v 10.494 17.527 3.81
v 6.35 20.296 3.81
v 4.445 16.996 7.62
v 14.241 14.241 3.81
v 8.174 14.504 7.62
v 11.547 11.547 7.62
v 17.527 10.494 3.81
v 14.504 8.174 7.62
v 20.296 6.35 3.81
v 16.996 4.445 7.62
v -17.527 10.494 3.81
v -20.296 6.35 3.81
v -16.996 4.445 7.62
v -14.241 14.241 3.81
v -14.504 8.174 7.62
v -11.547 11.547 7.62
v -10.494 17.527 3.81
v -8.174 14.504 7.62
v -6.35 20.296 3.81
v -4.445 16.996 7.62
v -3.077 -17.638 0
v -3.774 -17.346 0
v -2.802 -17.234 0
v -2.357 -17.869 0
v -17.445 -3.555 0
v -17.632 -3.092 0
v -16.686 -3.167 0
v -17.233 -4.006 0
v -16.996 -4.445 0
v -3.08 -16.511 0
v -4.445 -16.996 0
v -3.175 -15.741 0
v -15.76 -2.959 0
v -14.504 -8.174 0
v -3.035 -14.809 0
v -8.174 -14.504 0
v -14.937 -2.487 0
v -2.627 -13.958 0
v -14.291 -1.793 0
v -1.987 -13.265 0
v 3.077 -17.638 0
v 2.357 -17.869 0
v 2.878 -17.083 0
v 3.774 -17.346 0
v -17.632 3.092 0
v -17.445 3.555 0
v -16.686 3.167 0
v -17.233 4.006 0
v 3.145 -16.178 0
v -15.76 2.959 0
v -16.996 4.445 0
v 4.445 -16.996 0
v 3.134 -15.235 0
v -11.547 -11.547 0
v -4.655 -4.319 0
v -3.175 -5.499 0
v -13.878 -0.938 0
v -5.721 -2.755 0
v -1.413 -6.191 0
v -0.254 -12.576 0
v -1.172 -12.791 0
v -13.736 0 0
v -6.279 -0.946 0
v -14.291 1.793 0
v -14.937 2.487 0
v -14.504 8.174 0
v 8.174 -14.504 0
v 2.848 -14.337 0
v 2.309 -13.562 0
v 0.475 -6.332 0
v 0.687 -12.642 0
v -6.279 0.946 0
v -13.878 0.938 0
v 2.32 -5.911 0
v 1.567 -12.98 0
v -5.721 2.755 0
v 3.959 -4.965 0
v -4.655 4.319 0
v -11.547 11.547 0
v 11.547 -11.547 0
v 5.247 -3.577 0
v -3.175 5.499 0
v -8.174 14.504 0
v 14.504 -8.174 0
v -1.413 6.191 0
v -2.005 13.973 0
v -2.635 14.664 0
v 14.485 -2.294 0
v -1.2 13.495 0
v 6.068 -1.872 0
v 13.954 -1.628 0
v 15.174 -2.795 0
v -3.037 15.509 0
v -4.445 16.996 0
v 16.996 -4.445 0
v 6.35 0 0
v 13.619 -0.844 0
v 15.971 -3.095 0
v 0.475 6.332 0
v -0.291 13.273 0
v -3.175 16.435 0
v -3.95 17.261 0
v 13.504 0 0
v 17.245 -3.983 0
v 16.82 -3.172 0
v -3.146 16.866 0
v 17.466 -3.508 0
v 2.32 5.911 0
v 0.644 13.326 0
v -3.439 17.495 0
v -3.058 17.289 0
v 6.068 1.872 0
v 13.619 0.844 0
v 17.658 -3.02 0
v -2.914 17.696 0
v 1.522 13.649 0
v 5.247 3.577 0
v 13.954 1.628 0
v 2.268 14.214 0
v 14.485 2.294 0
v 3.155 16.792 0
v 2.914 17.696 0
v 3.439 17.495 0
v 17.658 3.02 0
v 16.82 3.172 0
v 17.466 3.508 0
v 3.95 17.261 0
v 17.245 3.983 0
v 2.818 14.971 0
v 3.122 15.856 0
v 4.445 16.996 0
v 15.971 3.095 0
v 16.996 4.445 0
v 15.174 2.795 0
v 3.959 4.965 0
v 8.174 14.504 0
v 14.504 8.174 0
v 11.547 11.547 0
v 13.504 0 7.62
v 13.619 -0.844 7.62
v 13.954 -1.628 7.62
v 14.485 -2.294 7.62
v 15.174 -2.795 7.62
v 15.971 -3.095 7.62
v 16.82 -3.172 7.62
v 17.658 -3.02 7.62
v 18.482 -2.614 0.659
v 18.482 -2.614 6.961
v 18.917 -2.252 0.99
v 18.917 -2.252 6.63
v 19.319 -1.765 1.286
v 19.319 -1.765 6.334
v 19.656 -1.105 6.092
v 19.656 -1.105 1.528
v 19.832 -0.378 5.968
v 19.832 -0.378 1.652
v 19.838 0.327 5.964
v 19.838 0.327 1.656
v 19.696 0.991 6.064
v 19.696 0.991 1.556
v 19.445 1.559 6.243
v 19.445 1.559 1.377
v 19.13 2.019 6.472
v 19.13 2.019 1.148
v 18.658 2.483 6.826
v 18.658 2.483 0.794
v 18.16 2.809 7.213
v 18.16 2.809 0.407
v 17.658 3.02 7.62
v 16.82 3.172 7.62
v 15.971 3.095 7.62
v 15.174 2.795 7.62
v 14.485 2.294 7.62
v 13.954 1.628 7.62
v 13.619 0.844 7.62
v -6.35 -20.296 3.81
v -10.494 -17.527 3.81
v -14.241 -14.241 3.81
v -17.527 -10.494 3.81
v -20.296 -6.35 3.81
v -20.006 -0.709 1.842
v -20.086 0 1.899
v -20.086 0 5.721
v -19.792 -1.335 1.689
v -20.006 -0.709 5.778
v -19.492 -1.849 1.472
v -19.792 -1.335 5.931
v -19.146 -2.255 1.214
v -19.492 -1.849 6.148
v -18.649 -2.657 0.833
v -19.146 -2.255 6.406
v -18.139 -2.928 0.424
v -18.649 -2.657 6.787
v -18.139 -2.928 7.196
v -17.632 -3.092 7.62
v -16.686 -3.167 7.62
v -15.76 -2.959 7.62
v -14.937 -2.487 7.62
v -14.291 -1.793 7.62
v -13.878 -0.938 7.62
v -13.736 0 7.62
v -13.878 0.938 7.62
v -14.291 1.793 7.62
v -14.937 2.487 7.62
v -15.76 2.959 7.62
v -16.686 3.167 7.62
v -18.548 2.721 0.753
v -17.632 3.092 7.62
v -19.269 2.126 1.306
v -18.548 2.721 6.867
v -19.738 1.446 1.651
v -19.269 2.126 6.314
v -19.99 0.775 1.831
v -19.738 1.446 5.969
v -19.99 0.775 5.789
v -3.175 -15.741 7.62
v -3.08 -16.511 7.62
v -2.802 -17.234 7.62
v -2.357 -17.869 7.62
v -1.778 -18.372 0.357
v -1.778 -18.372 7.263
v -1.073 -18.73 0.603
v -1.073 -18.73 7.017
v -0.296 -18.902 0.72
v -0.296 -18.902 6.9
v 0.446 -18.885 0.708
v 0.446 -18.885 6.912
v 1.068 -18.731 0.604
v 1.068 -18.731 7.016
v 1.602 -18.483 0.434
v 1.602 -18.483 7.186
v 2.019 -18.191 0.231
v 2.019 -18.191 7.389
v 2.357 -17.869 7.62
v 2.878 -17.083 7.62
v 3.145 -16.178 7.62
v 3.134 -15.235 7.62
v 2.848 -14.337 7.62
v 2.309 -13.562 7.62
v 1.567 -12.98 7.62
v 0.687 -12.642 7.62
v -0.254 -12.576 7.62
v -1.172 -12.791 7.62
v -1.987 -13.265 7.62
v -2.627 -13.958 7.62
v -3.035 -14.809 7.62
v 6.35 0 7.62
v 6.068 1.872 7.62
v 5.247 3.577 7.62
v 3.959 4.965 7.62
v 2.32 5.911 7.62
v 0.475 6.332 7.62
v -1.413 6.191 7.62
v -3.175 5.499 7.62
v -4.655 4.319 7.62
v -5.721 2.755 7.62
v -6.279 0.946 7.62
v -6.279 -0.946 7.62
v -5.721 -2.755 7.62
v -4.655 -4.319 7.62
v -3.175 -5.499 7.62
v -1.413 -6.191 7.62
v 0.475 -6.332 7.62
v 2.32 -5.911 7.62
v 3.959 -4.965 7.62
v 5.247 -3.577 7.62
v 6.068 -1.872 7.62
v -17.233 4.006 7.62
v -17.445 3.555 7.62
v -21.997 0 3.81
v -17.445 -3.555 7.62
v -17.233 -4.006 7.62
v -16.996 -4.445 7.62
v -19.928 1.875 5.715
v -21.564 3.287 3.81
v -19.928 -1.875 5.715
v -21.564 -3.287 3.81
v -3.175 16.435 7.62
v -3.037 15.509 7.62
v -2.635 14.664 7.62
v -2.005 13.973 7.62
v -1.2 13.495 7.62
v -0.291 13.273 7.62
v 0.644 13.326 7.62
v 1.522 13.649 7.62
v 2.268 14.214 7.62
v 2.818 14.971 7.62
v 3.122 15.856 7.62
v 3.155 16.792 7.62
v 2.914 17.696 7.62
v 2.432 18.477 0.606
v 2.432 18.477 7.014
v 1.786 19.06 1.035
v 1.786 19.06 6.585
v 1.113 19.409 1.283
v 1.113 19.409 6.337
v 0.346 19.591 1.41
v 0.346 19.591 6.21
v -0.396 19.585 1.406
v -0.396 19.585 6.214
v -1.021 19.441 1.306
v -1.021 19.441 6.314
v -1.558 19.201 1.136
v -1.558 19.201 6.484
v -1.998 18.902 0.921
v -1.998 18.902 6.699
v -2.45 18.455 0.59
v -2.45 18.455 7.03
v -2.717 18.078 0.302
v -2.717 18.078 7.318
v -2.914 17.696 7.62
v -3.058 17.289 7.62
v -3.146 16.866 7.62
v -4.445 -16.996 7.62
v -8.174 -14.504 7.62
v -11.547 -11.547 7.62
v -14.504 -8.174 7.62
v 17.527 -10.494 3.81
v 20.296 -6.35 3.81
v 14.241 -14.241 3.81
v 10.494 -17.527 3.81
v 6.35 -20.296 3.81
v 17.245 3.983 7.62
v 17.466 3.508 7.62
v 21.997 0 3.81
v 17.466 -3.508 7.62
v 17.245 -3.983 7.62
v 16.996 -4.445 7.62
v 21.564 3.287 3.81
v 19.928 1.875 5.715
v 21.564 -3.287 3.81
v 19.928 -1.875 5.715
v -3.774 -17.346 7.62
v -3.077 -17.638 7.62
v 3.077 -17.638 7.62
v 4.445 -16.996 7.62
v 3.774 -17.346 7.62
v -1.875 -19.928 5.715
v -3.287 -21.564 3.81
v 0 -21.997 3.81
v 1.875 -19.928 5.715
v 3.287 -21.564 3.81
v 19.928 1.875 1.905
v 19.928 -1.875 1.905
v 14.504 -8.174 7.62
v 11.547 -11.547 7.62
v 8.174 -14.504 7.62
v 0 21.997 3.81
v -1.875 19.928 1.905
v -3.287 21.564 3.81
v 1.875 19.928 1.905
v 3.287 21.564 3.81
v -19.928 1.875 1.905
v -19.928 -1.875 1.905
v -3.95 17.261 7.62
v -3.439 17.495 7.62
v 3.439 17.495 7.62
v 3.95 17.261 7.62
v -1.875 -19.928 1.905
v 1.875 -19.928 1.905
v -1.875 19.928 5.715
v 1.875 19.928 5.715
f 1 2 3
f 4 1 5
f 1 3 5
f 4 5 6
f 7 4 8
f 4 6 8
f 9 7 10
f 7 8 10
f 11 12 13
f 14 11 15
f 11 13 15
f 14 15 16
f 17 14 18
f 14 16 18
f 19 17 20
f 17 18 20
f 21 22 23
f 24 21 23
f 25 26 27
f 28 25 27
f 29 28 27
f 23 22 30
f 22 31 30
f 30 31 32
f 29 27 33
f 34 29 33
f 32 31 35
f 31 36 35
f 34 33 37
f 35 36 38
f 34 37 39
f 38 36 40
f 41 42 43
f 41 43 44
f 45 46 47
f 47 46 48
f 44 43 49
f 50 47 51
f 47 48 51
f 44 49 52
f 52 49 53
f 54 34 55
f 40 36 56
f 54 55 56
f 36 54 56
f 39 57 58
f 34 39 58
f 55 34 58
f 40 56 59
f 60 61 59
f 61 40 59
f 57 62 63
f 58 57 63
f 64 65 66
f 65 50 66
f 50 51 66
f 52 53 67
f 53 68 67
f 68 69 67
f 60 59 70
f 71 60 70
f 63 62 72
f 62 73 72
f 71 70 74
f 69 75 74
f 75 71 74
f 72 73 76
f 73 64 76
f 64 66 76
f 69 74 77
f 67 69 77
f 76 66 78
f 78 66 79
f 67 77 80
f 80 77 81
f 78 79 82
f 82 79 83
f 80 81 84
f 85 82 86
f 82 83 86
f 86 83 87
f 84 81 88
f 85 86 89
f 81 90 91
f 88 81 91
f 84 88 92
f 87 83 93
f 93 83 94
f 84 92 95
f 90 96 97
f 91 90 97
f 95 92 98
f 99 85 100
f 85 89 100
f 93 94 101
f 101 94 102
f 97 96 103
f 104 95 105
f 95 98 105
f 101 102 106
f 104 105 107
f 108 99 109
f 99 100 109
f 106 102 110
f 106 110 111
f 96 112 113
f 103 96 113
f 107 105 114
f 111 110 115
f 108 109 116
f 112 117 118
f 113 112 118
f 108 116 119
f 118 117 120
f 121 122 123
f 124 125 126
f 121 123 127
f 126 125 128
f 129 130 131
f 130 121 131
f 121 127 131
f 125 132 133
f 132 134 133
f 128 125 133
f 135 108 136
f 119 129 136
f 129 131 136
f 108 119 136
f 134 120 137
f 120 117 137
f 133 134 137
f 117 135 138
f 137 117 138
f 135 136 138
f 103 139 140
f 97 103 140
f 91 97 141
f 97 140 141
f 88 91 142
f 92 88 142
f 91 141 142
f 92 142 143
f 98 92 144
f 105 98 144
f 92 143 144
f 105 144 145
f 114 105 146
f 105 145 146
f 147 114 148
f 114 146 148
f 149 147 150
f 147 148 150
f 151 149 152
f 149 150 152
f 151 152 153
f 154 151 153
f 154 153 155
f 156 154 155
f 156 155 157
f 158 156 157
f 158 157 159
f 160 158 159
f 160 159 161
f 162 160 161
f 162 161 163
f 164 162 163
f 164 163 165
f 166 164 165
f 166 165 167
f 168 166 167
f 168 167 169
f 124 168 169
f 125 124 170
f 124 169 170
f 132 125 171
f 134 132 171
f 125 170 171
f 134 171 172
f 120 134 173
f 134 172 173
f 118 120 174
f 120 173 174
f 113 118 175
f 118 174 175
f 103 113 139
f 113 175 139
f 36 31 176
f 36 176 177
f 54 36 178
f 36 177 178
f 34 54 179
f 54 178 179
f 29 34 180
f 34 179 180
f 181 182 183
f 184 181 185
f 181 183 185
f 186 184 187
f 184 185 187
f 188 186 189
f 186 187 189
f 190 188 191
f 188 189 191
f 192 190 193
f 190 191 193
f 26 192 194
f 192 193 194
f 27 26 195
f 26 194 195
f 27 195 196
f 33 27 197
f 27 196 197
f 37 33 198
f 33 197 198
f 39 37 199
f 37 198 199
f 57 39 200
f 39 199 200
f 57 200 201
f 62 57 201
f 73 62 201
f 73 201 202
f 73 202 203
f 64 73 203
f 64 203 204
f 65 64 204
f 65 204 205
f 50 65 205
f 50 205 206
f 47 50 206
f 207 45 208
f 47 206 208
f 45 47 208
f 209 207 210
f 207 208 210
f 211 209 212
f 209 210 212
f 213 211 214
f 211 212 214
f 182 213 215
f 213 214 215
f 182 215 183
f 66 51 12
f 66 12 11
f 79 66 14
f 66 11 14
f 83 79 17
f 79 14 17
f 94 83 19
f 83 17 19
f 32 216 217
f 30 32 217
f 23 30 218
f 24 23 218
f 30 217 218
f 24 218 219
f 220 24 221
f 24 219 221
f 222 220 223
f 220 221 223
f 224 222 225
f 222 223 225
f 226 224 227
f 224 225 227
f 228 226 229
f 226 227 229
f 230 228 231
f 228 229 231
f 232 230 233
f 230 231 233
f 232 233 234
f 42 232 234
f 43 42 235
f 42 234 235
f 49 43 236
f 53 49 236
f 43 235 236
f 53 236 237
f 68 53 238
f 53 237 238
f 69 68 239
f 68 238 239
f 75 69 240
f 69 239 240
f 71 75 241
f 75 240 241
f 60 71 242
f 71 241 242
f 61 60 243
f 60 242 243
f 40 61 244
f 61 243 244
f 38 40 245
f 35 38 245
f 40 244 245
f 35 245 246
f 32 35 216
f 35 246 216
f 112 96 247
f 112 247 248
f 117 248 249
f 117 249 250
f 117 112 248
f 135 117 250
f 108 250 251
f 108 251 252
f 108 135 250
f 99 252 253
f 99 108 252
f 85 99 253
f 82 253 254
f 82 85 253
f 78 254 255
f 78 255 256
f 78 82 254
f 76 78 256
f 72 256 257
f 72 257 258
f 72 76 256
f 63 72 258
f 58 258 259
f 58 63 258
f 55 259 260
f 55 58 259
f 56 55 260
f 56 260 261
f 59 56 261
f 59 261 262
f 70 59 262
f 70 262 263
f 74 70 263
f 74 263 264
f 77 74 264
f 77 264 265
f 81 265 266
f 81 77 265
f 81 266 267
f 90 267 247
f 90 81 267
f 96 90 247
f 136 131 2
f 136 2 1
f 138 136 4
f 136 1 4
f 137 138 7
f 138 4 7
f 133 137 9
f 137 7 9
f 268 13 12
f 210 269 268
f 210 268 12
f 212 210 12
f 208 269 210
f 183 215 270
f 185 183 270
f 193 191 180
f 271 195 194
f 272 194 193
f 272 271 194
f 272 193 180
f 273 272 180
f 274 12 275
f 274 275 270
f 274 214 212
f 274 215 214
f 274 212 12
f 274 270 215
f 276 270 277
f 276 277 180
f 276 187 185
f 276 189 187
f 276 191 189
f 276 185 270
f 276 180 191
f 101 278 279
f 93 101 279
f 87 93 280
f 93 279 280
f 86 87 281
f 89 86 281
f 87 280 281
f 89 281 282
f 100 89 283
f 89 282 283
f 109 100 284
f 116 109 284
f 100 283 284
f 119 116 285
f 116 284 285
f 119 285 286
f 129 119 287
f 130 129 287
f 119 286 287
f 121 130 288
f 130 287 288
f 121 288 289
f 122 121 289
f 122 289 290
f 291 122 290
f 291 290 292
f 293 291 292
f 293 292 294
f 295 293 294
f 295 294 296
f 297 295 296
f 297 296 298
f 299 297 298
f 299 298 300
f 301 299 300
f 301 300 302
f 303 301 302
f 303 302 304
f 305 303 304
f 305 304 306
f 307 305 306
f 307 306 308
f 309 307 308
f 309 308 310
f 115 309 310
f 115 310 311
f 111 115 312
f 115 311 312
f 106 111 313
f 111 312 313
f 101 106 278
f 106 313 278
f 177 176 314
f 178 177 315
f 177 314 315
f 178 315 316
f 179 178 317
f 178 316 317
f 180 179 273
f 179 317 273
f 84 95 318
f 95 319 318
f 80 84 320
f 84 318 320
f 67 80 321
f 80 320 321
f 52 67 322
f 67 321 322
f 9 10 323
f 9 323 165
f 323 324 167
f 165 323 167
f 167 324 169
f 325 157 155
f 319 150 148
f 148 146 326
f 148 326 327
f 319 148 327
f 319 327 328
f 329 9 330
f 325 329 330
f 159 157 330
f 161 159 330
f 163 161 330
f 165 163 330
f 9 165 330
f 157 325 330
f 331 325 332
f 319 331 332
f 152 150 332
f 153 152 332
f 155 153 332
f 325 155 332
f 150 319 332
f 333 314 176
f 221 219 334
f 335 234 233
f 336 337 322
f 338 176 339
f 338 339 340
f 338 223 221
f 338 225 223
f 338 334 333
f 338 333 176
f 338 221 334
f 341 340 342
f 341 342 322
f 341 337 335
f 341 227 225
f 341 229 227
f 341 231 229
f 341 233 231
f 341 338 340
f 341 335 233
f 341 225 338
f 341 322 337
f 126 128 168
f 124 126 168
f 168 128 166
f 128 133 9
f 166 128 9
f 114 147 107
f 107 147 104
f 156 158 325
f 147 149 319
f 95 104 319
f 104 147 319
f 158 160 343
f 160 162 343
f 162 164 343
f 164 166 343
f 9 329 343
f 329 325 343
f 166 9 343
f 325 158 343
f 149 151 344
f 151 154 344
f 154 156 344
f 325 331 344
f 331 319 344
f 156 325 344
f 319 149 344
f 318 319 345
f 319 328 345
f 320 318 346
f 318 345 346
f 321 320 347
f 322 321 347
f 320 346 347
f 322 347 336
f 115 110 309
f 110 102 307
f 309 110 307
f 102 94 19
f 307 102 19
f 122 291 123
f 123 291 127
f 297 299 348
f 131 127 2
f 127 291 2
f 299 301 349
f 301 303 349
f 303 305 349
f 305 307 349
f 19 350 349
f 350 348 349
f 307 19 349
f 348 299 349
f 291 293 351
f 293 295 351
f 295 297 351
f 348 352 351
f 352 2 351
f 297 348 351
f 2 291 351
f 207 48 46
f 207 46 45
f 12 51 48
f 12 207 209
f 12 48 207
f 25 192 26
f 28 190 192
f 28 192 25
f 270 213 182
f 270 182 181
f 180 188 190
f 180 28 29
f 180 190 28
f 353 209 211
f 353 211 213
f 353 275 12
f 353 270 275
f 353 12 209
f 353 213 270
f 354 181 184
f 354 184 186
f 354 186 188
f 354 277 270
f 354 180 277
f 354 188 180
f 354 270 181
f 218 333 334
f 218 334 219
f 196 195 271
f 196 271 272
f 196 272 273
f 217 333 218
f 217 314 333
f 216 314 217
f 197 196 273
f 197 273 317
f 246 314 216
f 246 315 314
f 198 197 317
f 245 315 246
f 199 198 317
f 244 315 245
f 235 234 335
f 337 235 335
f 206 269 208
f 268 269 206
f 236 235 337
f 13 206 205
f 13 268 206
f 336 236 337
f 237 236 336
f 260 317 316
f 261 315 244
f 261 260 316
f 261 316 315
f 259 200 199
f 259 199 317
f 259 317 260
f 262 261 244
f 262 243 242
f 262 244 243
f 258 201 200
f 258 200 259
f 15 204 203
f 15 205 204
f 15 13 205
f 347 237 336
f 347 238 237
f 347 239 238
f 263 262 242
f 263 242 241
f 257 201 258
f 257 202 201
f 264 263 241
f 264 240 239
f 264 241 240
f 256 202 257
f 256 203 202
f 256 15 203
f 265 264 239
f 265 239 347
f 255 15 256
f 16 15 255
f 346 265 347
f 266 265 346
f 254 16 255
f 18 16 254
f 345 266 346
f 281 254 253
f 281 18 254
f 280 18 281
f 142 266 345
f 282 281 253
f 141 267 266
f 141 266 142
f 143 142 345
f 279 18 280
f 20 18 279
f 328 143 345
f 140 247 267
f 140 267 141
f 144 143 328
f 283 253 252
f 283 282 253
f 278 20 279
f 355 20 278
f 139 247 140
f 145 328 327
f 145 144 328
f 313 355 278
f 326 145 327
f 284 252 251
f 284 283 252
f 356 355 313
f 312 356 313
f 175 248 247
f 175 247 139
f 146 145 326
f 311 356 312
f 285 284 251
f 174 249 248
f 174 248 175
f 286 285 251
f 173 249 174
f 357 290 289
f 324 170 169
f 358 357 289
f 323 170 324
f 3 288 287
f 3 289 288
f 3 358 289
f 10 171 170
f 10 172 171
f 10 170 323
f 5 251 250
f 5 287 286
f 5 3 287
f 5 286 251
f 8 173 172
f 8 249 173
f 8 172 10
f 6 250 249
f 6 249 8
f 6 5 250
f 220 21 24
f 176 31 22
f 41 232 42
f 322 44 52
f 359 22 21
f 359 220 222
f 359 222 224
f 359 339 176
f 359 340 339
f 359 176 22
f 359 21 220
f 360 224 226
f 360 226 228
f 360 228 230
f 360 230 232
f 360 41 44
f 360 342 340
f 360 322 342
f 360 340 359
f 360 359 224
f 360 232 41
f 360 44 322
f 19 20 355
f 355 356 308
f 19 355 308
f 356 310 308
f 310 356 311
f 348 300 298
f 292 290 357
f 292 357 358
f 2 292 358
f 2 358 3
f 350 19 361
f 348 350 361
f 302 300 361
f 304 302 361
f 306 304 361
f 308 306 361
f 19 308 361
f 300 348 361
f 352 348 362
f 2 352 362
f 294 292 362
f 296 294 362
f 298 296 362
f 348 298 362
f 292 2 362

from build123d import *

# Parameters (mm, degrees)
F0_W         = 50.8
F0_H         = 50.8
F0_R         = 6.35
F1_DEPTH     = 7.62
F2_T1_DEPTH  = 198.12
F4_D         = 6.35
F5_R         = 12.7
F6_T2_ANGLE  = 29.9999999999
F6_T4_ANGLE  = 29.9999999999
F6_T6_ANGLE  = 60.000000035
F6_T8_ANGLE  = 60.000000035
F6_T10_ANGLE = 29.9999999999
F6_T12_ANGLE = 60.000000035
F6_T14_ANGLE = 29.9999999999
F6_T16_ANGLE = 60.000000035
F6_T18_ANGLE = 29.9999999999
F6_T20_ANGLE = 60.000000035
F6_T22_ANGLE = 60.000000035
F6_T24_ANGLE = 29.9999999999
F6_T26_ANGLE = 60.000000035
F6_T28_ANGLE = 29.9999999999
F6_T30_ANGLE = 60.000000035
F6_T32_ANGLE = 29.9999999999


# Not quite as in the source:
# - a fillet or chamfer that OpenCascade refuses, or shapes differently, is made with other operations: its cross-section is extruded or revolved along the edge and cut away or added


with BuildPart() as f1:
    # F0 (on Top) → F1 (new body)
    with BuildSketch(Plane.XY):
        Rectangle(F0_W, F0_H)
        Circle(F0_R, mode=Mode.SUBTRACT)
    extrude(amount=F1_DEPTH)

    # F2: fillet of radius 38.1 on 4 edges, made by hand

    # F2_s2 → F2_t1 (cut)
    with BuildSketch(Plane.XY.offset(-95.25)):
        with BuildLine():
            ThreePointArc((25.4, 12.7), (14.2407683632, -14.2407683632), (-12.7, -25.4))
            Line((-12.7, -25.4), (25.4, -25.4))
            Line((25.4, -25.4), (25.4, 12.7))
        make_face()
        with BuildLine():
            ThreePointArc((-25.4, 12.7), (-14.2407683632, -14.2407683632), (12.7, -25.4))
            Line((12.7, -25.4), (-25.4, -25.4))
            Line((-25.4, -25.4), (-25.4, 12.7))
        make_face()
        with BuildLine():
            ThreePointArc((12.7, 25.4), (-14.2407683632, 14.2407683632), (-25.4, -12.7))
            Line((-25.4, -12.7), (-25.4, 25.4))
            Line((-25.4, 25.4), (12.7, 25.4))
        make_face()
        with BuildLine():
            ThreePointArc((25.4, -12.7), (14.2407683632, 14.2407683632), (-12.7, 25.4))
            Line((-12.7, 25.4), (25.4, 25.4))
            Line((25.4, 25.4), (25.4, -12.7))
        make_face()
    extrude(amount=F2_T1_DEPTH, mode=Mode.SUBTRACT)

    # F4 (through all)
    with Locations(Plane(origin=(0, 0, 0), x_dir=(1, 0, 0), z_dir=(0, 0, -1))):
        with Locations((0, -16.4350587875), (-16.9112086296, 0), (0, 15.7412625849), (16.6794583201, 0)):
            Hole(F4_D / 2)

    # F5
    f5_edges = [f1.edges().sort_by_distance(p)[0] for p in [
        (0, -23.221024, 3.81),
        (23.221024, 0, 3.81),
        (-23.221024, 0, 3.81),
        (0, 23.221024, 3.81),
    ]]
    fillet(f5_edges, radius=F5_R)

    # F6: chamfer of 3.81 on 2 edges, made by hand

    # F6_s1 → F6_t2 (revolve, cut)
    with BuildSketch(Plane(origin=(2.324261314, 4.025738686, 0), x_dir=(0, 0, 1), z_dir=(0.5, 0.8660254038, 0))):
        Polygon((3.81, 20.7514773719), (7.62, 16.9414773719), (7.62, 20.7514773719), align=None)
    revolve(axis=Axis((-12.7, 12.7, 7.62), (0, 0, -1)), revolution_arc=F6_T2_ANGLE, mode=Mode.SUBTRACT)

    # F6_s3 → F6_t4 (revolve, cut)
    with BuildSketch(Plane(origin=(2.324261314, 4.025738686, 0), x_dir=(0, 0, 1), z_dir=(0.5, 0.8660254038, 0))):
        Polygon((0, 16.9414773719), (3.81, 20.7514773719), (0, 20.7514773719), align=None)
    revolve(axis=Axis((-12.7, 12.7, 0), (0, 0, -1)), revolution_arc=F6_T4_ANGLE, mode=Mode.SUBTRACT)

    # F6_s5 → F6_t6 (revolve, cut)
    with BuildSketch(Plane(origin=(2.324261317, -4.0257386892, 0), x_dir=(0, 0, 1), z_dir=(-0.5000000002, 0.8660254037, 0))):
        Polygon((0, 16.941477371), (3.81, 20.7514773707), (0, 20.751477371), align=None)
    revolve(axis=Axis((9.2970452639, 1.5e-09, 0), (0, 0, -1)), revolution_arc=F6_T6_ANGLE, mode=Mode.SUBTRACT)

    # F6_s7 → F6_t8 (revolve, cut)
    with BuildSketch(Plane(origin=(4.0257386892, -2.324261317, 0), x_dir=(0, 0, 1), z_dir=(-0.8660254037, 0.5000000002, 0))):
        Polygon((0, -16.941477371), (3.81, -20.7514773707), (0, -20.751477371), align=None)
    revolve(axis=Axis((-1.5e-09, -9.2970452639, 0), (0, 0, 1)), revolution_arc=F6_T8_ANGLE, mode=Mode.SUBTRACT)

    # F6_s9 → F6_t10 (revolve, cut)
    with BuildSketch(Plane(origin=(4.025738686, -2.324261314, 0), x_dir=(0, 0, 1), z_dir=(0.8660254038, -0.5, 0))):
        Polygon((0, 16.9414773719), (3.81, 20.7514773719), (0, 20.7514773719), align=None)
    revolve(axis=Axis((12.7, 12.7, 0), (0, 0, -1)), revolution_arc=F6_T10_ANGLE, mode=Mode.SUBTRACT)

    # F6_s11 → F6_t12 (revolve, cut)
    with BuildSketch(Plane(origin=(-2.324261317, -4.0257386892, 0), x_dir=(0, 0, 1), z_dir=(0.5000000002, 0.8660254037, 0))):
        Polygon((0, -16.941477371), (3.81, -20.7514773707), (0, -20.751477371), align=None)
    revolve(axis=Axis((-9.2970452639, 1.5e-09, 0), (0, 0, 1)), revolution_arc=F6_T12_ANGLE, mode=Mode.SUBTRACT)

    # F6_s13 → F6_t14 (revolve, cut)
    with BuildSketch(Plane(origin=(-2.324261314, -4.025738686, 0), x_dir=(0, 0, 1), z_dir=(-0.5, -0.8660254038, 0))):
        Polygon((0, 16.9414773719), (3.81, 20.7514773719), (0, 20.7514773719), align=None)
    revolve(axis=Axis((12.7, -12.7, 0), (0, 0, -1)), revolution_arc=F6_T14_ANGLE, mode=Mode.SUBTRACT)

    # F6_s15 → F6_t16 (revolve, cut)
    with BuildSketch(Plane(origin=(4.0257386892, 2.324261317, 0), x_dir=(0, 0, 1), z_dir=(-0.8660254037, -0.5000000002, 0))):
        Polygon((0, 16.941477371), (3.81, 20.7514773707), (0, 20.751477371), align=None)
    revolve(axis=Axis((-1.5e-09, 9.2970452639, 0), (0, 0, -1)), revolution_arc=F6_T16_ANGLE, mode=Mode.SUBTRACT)

    # F6_s17 → F6_t18 (revolve, cut)
    with BuildSketch(Plane(origin=(-4.025738686, 2.324261314, 0), x_dir=(0, 0, 1), z_dir=(-0.8660254038, 0.5, 0))):
        Polygon((0, 16.9414773719), (3.81, 20.7514773719), (0, 20.7514773719), align=None)
    revolve(axis=Axis((-12.7, -12.7, 0), (0, 0, -1)), revolution_arc=F6_T18_ANGLE, mode=Mode.SUBTRACT)

    # F6_s19 → F6_t20 (revolve, cut)
    with BuildSketch(Plane(origin=(2.324261317, -4.0257386892, 0), x_dir=(0, 0, 1), z_dir=(-0.5000000002, 0.8660254037, 0))):
        Polygon((3.81, 20.7514773707), (7.62, 16.941477371), (7.62, 20.751477371), align=None)
    revolve(axis=Axis((9.2970452639, 1.5e-09, 7.62), (0, 0, -1)), revolution_arc=F6_T20_ANGLE, mode=Mode.SUBTRACT)

    # F6_s21 → F6_t22 (revolve, cut)
    with BuildSketch(Plane(origin=(4.0257386892, -2.324261317, 0), x_dir=(0, 0, 1), z_dir=(-0.8660254037, 0.5000000002, 0))):
        Polygon((3.81, -20.7514773707), (7.62, -16.941477371), (7.62, -20.751477371), align=None)
    revolve(axis=Axis((-1.5e-09, -9.2970452639, 7.62), (0, 0, 1)), revolution_arc=F6_T22_ANGLE, mode=Mode.SUBTRACT)

    # F6_s23 → F6_t24 (revolve, cut)
    with BuildSketch(Plane(origin=(4.025738686, -2.324261314, 0), x_dir=(0, 0, 1), z_dir=(0.8660254038, -0.5, 0))):
        Polygon((3.81, 20.7514773719), (7.62, 16.9414773719), (7.62, 20.7514773719), align=None)
    revolve(axis=Axis((12.7, 12.7, 7.62), (0, 0, -1)), revolution_arc=F6_T24_ANGLE, mode=Mode.SUBTRACT)

    # F6_s25 → F6_t26 (revolve, cut)
    with BuildSketch(Plane(origin=(-2.324261317, -4.0257386892, 0), x_dir=(0, 0, 1), z_dir=(0.5000000002, 0.8660254037, 0))):
        Polygon((3.81, -20.7514773707), (7.62, -16.941477371), (7.62, -20.751477371), align=None)
    revolve(axis=Axis((-9.2970452639, 1.5e-09, 7.62), (0, 0, 1)), revolution_arc=F6_T26_ANGLE, mode=Mode.SUBTRACT)

    # F6_s27 → F6_t28 (revolve, cut)
    with BuildSketch(Plane(origin=(-2.324261314, -4.025738686, 0), x_dir=(0, 0, 1), z_dir=(-0.5, -0.8660254038, 0))):
        Polygon((3.81, 20.7514773719), (7.62, 16.9414773719), (7.62, 20.7514773719), align=None)
    revolve(axis=Axis((12.7, -12.7, 7.62), (0, 0, -1)), revolution_arc=F6_T28_ANGLE, mode=Mode.SUBTRACT)

    # F6_s29 → F6_t30 (revolve, cut)
    with BuildSketch(Plane(origin=(4.0257386892, 2.324261317, 0), x_dir=(0, 0, 1), z_dir=(-0.8660254037, -0.5000000002, 0))):
        Polygon((3.81, 20.7514773707), (7.62, 16.941477371), (7.62, 20.751477371), align=None)
    revolve(axis=Axis((-1.5e-09, 9.2970452639, 7.62), (0, 0, -1)), revolution_arc=F6_T30_ANGLE, mode=Mode.SUBTRACT)

    # F6_s31 → F6_t32 (revolve, cut)
    with BuildSketch(Plane(origin=(-4.025738686, 2.324261314, 0), x_dir=(0, 0, 1), z_dir=(-0.8660254038, 0.5, 0))):
        Polygon((3.81, 20.7514773719), (7.62, 16.9414773719), (7.62, 20.7514773719), align=None)
    revolve(axis=Axis((-12.7, -12.7, 7.62), (0, 0, -1)), revolution_arc=F6_T32_ANGLE, mode=Mode.SUBTRACT)


solid = f1.part
